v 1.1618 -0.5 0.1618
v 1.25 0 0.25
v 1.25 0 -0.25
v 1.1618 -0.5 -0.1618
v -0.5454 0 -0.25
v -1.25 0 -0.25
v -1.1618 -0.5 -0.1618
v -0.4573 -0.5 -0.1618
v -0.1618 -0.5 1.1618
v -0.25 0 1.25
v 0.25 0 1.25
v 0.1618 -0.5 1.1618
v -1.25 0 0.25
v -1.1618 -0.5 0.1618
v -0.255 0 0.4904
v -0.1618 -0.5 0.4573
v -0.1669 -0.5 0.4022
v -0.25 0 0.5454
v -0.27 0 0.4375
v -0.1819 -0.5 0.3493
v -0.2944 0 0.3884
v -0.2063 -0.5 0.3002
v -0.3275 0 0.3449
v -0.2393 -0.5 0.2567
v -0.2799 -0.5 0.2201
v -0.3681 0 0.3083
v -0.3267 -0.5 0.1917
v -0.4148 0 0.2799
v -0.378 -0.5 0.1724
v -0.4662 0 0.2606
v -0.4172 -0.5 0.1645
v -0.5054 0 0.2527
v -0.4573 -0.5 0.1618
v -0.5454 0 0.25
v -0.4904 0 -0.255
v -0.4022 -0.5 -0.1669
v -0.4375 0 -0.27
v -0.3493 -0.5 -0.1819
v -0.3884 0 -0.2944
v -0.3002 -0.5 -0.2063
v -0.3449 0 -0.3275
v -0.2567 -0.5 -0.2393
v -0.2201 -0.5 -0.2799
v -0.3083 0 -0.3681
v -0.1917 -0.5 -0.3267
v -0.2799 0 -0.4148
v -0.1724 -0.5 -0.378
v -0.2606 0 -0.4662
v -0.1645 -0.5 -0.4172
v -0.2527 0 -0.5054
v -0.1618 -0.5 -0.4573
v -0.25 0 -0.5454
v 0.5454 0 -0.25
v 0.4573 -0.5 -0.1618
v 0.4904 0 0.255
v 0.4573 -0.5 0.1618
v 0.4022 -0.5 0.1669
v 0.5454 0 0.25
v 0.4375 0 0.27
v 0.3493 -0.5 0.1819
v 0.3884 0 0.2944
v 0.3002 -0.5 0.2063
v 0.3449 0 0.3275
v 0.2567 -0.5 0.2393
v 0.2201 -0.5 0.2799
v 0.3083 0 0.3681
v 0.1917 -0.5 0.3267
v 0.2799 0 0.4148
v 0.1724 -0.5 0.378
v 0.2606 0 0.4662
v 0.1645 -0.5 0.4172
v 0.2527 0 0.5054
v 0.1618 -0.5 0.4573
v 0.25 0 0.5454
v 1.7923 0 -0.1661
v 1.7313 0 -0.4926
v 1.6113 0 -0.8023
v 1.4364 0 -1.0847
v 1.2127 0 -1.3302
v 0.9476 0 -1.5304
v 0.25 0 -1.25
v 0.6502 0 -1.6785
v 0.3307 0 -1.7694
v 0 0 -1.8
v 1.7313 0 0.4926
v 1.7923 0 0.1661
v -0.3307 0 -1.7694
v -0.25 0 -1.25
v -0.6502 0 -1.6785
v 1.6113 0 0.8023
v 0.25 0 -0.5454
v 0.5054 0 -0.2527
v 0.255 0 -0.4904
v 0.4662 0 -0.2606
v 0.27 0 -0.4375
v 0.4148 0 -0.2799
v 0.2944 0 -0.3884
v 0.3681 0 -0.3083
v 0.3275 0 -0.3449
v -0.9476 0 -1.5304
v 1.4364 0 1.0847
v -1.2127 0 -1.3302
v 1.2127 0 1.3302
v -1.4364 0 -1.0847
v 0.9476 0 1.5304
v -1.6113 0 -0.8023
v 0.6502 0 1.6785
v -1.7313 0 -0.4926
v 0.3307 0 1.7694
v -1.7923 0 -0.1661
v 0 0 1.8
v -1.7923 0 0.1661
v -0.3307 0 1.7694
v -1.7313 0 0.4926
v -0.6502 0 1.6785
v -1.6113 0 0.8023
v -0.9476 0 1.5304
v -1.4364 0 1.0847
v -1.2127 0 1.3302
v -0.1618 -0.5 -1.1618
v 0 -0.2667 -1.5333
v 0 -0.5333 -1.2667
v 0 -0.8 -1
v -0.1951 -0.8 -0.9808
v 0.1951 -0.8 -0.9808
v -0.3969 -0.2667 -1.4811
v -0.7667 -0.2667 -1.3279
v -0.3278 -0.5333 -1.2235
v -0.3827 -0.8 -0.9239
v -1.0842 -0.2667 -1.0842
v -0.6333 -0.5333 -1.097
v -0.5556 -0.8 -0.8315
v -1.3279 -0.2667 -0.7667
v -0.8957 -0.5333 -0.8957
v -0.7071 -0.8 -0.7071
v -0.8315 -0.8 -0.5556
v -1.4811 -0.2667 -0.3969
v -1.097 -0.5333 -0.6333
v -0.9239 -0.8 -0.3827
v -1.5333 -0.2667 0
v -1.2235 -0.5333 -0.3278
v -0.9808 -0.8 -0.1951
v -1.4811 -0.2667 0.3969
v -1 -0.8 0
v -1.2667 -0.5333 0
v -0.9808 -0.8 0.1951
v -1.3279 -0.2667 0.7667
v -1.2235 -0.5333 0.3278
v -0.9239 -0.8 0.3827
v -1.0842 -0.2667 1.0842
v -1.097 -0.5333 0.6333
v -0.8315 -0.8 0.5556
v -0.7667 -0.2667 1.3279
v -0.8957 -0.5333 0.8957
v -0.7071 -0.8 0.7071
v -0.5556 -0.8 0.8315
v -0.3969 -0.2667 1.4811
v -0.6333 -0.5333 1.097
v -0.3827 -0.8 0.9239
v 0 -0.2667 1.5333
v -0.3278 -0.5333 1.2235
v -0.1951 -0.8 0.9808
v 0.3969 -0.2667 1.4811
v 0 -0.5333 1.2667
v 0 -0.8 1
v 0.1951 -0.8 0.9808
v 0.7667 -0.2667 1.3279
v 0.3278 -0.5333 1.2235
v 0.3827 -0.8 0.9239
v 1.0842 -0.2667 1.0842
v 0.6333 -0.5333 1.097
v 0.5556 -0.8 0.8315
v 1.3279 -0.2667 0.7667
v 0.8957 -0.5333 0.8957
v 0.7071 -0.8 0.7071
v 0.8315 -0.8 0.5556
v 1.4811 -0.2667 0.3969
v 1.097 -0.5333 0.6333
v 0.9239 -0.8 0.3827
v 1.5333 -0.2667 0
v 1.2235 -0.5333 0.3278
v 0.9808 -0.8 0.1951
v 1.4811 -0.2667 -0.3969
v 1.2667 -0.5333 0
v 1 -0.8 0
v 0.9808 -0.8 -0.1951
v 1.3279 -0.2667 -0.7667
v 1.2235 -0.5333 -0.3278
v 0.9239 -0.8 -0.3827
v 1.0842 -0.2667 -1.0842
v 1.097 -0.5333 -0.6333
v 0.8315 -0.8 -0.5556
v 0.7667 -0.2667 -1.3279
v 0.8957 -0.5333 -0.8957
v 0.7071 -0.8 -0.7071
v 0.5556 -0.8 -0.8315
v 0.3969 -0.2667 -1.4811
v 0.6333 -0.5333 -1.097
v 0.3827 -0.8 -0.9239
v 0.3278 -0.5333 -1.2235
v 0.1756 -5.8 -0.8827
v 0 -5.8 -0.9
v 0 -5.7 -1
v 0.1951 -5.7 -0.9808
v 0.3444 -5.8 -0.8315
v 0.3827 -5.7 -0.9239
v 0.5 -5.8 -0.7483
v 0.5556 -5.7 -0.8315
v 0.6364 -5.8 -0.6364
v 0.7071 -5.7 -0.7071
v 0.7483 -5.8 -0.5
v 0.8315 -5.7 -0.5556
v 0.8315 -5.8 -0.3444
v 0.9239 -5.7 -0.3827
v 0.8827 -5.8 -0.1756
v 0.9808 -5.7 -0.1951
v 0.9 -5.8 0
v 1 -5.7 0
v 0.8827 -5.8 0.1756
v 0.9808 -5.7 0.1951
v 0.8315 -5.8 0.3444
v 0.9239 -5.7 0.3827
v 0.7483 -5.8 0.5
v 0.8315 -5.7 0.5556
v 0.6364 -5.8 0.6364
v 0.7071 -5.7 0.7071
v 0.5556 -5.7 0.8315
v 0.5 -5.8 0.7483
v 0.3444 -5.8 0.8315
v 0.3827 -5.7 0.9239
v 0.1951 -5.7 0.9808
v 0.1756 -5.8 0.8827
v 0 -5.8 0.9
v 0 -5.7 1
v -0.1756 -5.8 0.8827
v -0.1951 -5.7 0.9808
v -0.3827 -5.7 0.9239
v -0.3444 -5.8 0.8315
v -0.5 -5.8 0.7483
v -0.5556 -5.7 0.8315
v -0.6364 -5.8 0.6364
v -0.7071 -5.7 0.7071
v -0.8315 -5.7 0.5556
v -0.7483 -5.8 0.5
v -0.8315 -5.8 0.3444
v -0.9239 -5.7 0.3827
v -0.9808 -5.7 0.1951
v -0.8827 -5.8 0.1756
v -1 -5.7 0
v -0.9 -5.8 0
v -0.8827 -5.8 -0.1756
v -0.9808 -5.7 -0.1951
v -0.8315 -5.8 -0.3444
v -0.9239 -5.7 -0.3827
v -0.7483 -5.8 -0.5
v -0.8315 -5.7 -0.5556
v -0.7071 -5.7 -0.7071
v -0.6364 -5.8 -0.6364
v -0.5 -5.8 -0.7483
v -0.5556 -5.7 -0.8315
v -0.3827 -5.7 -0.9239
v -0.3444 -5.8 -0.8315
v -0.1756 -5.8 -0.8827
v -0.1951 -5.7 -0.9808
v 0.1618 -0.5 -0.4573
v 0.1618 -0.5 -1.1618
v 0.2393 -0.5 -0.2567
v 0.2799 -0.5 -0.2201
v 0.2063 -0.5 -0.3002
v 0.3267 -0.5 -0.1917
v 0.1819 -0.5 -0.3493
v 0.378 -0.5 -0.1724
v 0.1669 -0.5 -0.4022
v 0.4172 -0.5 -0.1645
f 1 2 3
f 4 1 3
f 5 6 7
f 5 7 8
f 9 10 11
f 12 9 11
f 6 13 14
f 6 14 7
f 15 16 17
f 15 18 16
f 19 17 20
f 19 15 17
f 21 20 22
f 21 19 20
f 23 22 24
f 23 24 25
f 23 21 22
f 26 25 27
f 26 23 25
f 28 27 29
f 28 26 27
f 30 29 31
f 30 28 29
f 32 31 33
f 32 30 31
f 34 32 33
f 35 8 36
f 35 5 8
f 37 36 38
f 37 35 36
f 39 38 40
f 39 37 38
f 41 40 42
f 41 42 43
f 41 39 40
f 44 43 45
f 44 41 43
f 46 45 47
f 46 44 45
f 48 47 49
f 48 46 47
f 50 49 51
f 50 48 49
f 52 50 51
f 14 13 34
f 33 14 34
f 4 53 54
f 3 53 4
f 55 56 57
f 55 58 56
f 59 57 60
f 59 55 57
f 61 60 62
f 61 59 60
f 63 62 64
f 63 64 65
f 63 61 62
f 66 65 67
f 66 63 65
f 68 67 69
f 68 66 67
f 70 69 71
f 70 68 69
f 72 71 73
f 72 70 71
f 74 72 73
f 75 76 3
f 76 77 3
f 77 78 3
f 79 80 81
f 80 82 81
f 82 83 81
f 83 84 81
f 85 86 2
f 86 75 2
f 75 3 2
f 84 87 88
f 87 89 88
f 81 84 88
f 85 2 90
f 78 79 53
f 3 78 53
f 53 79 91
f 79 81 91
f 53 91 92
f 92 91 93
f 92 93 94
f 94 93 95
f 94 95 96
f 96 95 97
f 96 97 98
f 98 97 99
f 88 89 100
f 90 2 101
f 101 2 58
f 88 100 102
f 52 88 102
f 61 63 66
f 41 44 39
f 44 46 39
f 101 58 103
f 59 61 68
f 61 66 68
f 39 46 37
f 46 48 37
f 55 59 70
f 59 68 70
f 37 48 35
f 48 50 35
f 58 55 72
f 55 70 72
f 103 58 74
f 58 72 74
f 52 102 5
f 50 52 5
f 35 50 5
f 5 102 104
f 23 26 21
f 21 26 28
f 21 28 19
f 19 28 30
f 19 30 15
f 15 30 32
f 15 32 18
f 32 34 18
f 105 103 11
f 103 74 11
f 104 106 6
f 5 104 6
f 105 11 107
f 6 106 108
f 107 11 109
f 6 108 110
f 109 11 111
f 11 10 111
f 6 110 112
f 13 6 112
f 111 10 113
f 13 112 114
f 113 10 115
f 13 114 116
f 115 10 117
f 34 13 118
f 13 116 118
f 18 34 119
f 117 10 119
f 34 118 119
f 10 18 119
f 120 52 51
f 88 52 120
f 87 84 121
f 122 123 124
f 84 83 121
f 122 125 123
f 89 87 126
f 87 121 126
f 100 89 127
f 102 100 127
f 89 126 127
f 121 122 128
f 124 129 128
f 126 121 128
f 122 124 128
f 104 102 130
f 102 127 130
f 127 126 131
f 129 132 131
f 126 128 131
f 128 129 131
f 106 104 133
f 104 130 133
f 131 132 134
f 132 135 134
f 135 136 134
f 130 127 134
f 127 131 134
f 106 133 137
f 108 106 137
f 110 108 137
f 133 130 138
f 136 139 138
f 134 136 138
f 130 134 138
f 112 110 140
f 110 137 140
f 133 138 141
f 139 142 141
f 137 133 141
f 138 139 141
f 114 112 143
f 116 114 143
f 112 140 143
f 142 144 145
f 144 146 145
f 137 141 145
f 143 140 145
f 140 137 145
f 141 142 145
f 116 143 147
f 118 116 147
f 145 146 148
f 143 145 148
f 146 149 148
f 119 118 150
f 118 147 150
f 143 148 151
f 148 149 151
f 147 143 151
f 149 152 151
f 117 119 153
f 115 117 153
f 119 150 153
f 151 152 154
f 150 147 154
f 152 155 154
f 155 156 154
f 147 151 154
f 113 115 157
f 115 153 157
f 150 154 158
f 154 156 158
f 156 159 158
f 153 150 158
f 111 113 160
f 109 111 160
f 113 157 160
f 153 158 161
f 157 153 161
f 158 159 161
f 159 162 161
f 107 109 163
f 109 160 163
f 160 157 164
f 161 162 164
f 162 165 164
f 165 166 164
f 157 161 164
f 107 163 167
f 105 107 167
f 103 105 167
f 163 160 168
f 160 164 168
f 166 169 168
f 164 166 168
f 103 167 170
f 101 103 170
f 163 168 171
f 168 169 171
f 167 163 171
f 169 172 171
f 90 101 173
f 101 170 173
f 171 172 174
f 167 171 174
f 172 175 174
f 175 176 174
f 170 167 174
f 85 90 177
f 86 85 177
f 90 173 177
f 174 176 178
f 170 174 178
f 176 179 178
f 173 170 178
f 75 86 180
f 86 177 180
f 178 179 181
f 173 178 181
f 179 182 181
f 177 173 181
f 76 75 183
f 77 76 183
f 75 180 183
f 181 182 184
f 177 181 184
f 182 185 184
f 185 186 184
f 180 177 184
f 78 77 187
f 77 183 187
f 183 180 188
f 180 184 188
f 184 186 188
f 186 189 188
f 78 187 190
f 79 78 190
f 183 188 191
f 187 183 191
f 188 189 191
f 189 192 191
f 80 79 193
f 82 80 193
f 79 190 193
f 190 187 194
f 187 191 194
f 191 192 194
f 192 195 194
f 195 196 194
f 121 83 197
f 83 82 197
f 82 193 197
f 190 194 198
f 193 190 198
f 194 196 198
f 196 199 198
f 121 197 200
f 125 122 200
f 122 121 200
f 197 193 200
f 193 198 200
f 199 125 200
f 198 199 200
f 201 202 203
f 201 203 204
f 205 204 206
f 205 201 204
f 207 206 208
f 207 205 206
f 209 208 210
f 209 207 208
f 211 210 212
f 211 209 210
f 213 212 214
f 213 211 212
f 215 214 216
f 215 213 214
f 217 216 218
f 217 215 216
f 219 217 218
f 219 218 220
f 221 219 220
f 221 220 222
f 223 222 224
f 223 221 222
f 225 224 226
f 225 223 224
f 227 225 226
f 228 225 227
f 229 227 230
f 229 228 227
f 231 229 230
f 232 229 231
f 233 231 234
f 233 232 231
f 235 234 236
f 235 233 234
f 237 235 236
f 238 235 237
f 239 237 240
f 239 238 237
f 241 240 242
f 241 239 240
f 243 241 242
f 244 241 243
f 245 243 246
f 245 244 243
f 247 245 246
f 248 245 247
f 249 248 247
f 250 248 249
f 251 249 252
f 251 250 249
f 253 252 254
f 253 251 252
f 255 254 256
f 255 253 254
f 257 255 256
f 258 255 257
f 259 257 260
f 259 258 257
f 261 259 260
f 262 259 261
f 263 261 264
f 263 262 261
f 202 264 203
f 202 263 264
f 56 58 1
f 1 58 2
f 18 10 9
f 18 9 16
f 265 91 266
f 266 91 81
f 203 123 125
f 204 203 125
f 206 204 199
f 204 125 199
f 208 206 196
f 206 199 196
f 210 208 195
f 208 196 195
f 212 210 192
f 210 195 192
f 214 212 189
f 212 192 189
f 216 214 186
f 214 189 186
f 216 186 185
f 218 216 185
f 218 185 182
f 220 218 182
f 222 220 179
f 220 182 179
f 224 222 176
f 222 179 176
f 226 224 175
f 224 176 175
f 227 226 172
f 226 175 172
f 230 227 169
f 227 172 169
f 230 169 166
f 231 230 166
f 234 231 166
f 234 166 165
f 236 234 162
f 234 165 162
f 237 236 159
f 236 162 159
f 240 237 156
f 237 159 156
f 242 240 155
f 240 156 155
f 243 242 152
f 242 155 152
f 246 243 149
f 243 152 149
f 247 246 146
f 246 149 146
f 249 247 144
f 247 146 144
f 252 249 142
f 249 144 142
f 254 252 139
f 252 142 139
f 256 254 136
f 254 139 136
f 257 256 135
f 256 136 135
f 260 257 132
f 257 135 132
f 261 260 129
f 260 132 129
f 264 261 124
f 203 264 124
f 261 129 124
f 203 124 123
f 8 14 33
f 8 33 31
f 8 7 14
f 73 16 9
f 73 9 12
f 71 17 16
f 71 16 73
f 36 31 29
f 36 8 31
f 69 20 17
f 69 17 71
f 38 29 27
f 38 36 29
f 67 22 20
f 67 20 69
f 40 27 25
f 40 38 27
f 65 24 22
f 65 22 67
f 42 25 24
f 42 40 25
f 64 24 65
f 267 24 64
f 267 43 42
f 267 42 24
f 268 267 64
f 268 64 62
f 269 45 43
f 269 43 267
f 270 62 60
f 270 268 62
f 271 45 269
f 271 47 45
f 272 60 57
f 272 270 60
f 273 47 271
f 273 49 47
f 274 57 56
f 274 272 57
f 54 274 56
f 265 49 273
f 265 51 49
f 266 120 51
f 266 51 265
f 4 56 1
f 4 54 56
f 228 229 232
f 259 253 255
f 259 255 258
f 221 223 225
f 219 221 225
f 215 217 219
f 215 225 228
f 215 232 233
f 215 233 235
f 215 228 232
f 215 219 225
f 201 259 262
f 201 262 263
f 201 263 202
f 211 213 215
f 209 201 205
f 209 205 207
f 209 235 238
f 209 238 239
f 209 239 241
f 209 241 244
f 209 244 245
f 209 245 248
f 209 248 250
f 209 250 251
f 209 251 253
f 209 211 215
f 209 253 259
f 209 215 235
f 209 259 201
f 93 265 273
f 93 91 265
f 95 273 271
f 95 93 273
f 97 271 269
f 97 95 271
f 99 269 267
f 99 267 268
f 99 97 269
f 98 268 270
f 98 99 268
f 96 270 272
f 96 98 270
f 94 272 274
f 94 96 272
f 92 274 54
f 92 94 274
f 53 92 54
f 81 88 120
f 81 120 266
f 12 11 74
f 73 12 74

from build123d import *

# Parameters (mm, degrees)
SKETCH_2_R                    = 1
EXTRUDE_1_DEPTH               = 5
SKETCH_3_W                    = 2.5
SKETCH_3_H                    = 0.5
CUT_EXTRUDE_1_DEPTH           = 0.5
CUT_EXTRUDE_1_DRAFT           = -10
SKETCH_3_W_2                  = 0.5
SKETCH_3_H_2                  = 2.5
CUT_EXTRUDE_1_PROFILE_2_DEPTH = 0.5
CUT_EXTRUDE_1_PROFILE_2_DRAFT = -10
FILLET_1_R                    = 0.3
CHAMFER_2_SIZE                = 0.1


with BuildPart() as part:
    # 草图1 → 旋转1 (revolve)
    with BuildSketch(Plane.XY, mode=Mode.PRIVATE) as revolve_1_sk:
        Polygon((0, 0), (1.8, 0), (1, -0.8), (0, -0.8), align=None)
    revolve(revolve_1_sk.sketch.rotate(Axis((0, -0.8, 0), (0, 1, 0)), 90), axis=Axis((0, -0.8, 0), (0, 1, 0)))

    # 草图2 → 凸台-拉伸1 (add)
    with BuildSketch(Plane.XZ.offset(0.8)):
        with Locations(Location((0, 0, 0), (0, 0, 270))):
            Circle(SKETCH_2_R)
    extrude(amount=EXTRUDE_1_DEPTH)


with BuildPart() as cut_extrude_1_tool:
    # 草图3 → 切除-拉伸1 (with draft: the straight prism first)
    with BuildSketch(Plane(origin=(0, 0, 0), x_dir=(1, 0, 0), z_dir=(0, 1, 0))):
        Rectangle(SKETCH_3_W, SKETCH_3_H)
    extrude(amount=-CUT_EXTRUDE_1_DEPTH)
    # 切除-拉伸1: the draft: its side faces are tilted about the plane it starts from
    cut_extrude_1_sides = [cut_extrude_1_tool.faces().sort_by_distance(p)[0] for p in [
        (0, -0.25, 0.25),
        (1.25, -0.25, 0),
        (0, -0.25, -0.25),
        (-1.25, -0.25, 0),
    ]]
    draft(cut_extrude_1_sides, Plane(origin=(0, 0, 0), x_dir=(1, 0, 0), z_dir=(0, 1, 0)), CUT_EXTRUDE_1_DRAFT)


with BuildPart() as part_1:
    add(part.part)

    # 切除-拉伸1: cut by cut_extrude_1_tool
    add(cut_extrude_1_tool.part, mode=Mode.SUBTRACT)


with BuildPart() as cut_extrude_1_profile_2_tool:
    # 草图3 → 切除-拉伸1 profile 2 (with draft: the straight prism first)
    with BuildSketch(Plane(origin=(0, 0, 0), x_dir=(1, 0, 0), z_dir=(0, 1, 0))):
        Rectangle(SKETCH_3_W_2, SKETCH_3_H_2)
    extrude(amount=-CUT_EXTRUDE_1_PROFILE_2_DEPTH)
    # 切除-拉伸1 profile 2: the draft: its side faces are tilted about the plane it starts from
    cut_extrude_1_profile_2_sides = [cut_extrude_1_profile_2_tool.faces().sort_by_distance(p)[0] for p in [
        (-0.25, -0.25, 0),
        (0, -0.25, 1.25),
        (0.25, -0.25, 0),
        (0, -0.25, -1.25),
    ]]
    draft(cut_extrude_1_profile_2_sides, Plane(origin=(0, 0, 0), x_dir=(1, 0, 0), z_dir=(0, 1, 0)), CUT_EXTRUDE_1_PROFILE_2_DRAFT)


with BuildPart() as part_2:
    add(part_1.part)

    # 切除-拉伸1 profile 2: cut by cut_extrude_1_profile_2_tool
    add(cut_extrude_1_profile_2_tool.part, mode=Mode.SUBTRACT)

    # 圆角1
    fillet_1_edges = [part_2.edges().sort_by_distance(p)[0] for p in [
        (0.205918255, -0.25, -0.205918255),
        (0.205918255, -0.25, 0.205918255),
        (-0.205918255, -0.25, 0.205918255),
        (-0.205918255, -0.25, -0.205918255),
    ]]
    fillet(fillet_1_edges, radius=FILLET_1_R)

    # 倒角2
    chamfer_2_edges = [part_2.edges().sort_by_distance(p)[0] for p in [
        (0, -5.8, 1),
    ]]
    chamfer(chamfer_2_edges, length=CHAMFER_2_SIZE)


solid = part_2.part
